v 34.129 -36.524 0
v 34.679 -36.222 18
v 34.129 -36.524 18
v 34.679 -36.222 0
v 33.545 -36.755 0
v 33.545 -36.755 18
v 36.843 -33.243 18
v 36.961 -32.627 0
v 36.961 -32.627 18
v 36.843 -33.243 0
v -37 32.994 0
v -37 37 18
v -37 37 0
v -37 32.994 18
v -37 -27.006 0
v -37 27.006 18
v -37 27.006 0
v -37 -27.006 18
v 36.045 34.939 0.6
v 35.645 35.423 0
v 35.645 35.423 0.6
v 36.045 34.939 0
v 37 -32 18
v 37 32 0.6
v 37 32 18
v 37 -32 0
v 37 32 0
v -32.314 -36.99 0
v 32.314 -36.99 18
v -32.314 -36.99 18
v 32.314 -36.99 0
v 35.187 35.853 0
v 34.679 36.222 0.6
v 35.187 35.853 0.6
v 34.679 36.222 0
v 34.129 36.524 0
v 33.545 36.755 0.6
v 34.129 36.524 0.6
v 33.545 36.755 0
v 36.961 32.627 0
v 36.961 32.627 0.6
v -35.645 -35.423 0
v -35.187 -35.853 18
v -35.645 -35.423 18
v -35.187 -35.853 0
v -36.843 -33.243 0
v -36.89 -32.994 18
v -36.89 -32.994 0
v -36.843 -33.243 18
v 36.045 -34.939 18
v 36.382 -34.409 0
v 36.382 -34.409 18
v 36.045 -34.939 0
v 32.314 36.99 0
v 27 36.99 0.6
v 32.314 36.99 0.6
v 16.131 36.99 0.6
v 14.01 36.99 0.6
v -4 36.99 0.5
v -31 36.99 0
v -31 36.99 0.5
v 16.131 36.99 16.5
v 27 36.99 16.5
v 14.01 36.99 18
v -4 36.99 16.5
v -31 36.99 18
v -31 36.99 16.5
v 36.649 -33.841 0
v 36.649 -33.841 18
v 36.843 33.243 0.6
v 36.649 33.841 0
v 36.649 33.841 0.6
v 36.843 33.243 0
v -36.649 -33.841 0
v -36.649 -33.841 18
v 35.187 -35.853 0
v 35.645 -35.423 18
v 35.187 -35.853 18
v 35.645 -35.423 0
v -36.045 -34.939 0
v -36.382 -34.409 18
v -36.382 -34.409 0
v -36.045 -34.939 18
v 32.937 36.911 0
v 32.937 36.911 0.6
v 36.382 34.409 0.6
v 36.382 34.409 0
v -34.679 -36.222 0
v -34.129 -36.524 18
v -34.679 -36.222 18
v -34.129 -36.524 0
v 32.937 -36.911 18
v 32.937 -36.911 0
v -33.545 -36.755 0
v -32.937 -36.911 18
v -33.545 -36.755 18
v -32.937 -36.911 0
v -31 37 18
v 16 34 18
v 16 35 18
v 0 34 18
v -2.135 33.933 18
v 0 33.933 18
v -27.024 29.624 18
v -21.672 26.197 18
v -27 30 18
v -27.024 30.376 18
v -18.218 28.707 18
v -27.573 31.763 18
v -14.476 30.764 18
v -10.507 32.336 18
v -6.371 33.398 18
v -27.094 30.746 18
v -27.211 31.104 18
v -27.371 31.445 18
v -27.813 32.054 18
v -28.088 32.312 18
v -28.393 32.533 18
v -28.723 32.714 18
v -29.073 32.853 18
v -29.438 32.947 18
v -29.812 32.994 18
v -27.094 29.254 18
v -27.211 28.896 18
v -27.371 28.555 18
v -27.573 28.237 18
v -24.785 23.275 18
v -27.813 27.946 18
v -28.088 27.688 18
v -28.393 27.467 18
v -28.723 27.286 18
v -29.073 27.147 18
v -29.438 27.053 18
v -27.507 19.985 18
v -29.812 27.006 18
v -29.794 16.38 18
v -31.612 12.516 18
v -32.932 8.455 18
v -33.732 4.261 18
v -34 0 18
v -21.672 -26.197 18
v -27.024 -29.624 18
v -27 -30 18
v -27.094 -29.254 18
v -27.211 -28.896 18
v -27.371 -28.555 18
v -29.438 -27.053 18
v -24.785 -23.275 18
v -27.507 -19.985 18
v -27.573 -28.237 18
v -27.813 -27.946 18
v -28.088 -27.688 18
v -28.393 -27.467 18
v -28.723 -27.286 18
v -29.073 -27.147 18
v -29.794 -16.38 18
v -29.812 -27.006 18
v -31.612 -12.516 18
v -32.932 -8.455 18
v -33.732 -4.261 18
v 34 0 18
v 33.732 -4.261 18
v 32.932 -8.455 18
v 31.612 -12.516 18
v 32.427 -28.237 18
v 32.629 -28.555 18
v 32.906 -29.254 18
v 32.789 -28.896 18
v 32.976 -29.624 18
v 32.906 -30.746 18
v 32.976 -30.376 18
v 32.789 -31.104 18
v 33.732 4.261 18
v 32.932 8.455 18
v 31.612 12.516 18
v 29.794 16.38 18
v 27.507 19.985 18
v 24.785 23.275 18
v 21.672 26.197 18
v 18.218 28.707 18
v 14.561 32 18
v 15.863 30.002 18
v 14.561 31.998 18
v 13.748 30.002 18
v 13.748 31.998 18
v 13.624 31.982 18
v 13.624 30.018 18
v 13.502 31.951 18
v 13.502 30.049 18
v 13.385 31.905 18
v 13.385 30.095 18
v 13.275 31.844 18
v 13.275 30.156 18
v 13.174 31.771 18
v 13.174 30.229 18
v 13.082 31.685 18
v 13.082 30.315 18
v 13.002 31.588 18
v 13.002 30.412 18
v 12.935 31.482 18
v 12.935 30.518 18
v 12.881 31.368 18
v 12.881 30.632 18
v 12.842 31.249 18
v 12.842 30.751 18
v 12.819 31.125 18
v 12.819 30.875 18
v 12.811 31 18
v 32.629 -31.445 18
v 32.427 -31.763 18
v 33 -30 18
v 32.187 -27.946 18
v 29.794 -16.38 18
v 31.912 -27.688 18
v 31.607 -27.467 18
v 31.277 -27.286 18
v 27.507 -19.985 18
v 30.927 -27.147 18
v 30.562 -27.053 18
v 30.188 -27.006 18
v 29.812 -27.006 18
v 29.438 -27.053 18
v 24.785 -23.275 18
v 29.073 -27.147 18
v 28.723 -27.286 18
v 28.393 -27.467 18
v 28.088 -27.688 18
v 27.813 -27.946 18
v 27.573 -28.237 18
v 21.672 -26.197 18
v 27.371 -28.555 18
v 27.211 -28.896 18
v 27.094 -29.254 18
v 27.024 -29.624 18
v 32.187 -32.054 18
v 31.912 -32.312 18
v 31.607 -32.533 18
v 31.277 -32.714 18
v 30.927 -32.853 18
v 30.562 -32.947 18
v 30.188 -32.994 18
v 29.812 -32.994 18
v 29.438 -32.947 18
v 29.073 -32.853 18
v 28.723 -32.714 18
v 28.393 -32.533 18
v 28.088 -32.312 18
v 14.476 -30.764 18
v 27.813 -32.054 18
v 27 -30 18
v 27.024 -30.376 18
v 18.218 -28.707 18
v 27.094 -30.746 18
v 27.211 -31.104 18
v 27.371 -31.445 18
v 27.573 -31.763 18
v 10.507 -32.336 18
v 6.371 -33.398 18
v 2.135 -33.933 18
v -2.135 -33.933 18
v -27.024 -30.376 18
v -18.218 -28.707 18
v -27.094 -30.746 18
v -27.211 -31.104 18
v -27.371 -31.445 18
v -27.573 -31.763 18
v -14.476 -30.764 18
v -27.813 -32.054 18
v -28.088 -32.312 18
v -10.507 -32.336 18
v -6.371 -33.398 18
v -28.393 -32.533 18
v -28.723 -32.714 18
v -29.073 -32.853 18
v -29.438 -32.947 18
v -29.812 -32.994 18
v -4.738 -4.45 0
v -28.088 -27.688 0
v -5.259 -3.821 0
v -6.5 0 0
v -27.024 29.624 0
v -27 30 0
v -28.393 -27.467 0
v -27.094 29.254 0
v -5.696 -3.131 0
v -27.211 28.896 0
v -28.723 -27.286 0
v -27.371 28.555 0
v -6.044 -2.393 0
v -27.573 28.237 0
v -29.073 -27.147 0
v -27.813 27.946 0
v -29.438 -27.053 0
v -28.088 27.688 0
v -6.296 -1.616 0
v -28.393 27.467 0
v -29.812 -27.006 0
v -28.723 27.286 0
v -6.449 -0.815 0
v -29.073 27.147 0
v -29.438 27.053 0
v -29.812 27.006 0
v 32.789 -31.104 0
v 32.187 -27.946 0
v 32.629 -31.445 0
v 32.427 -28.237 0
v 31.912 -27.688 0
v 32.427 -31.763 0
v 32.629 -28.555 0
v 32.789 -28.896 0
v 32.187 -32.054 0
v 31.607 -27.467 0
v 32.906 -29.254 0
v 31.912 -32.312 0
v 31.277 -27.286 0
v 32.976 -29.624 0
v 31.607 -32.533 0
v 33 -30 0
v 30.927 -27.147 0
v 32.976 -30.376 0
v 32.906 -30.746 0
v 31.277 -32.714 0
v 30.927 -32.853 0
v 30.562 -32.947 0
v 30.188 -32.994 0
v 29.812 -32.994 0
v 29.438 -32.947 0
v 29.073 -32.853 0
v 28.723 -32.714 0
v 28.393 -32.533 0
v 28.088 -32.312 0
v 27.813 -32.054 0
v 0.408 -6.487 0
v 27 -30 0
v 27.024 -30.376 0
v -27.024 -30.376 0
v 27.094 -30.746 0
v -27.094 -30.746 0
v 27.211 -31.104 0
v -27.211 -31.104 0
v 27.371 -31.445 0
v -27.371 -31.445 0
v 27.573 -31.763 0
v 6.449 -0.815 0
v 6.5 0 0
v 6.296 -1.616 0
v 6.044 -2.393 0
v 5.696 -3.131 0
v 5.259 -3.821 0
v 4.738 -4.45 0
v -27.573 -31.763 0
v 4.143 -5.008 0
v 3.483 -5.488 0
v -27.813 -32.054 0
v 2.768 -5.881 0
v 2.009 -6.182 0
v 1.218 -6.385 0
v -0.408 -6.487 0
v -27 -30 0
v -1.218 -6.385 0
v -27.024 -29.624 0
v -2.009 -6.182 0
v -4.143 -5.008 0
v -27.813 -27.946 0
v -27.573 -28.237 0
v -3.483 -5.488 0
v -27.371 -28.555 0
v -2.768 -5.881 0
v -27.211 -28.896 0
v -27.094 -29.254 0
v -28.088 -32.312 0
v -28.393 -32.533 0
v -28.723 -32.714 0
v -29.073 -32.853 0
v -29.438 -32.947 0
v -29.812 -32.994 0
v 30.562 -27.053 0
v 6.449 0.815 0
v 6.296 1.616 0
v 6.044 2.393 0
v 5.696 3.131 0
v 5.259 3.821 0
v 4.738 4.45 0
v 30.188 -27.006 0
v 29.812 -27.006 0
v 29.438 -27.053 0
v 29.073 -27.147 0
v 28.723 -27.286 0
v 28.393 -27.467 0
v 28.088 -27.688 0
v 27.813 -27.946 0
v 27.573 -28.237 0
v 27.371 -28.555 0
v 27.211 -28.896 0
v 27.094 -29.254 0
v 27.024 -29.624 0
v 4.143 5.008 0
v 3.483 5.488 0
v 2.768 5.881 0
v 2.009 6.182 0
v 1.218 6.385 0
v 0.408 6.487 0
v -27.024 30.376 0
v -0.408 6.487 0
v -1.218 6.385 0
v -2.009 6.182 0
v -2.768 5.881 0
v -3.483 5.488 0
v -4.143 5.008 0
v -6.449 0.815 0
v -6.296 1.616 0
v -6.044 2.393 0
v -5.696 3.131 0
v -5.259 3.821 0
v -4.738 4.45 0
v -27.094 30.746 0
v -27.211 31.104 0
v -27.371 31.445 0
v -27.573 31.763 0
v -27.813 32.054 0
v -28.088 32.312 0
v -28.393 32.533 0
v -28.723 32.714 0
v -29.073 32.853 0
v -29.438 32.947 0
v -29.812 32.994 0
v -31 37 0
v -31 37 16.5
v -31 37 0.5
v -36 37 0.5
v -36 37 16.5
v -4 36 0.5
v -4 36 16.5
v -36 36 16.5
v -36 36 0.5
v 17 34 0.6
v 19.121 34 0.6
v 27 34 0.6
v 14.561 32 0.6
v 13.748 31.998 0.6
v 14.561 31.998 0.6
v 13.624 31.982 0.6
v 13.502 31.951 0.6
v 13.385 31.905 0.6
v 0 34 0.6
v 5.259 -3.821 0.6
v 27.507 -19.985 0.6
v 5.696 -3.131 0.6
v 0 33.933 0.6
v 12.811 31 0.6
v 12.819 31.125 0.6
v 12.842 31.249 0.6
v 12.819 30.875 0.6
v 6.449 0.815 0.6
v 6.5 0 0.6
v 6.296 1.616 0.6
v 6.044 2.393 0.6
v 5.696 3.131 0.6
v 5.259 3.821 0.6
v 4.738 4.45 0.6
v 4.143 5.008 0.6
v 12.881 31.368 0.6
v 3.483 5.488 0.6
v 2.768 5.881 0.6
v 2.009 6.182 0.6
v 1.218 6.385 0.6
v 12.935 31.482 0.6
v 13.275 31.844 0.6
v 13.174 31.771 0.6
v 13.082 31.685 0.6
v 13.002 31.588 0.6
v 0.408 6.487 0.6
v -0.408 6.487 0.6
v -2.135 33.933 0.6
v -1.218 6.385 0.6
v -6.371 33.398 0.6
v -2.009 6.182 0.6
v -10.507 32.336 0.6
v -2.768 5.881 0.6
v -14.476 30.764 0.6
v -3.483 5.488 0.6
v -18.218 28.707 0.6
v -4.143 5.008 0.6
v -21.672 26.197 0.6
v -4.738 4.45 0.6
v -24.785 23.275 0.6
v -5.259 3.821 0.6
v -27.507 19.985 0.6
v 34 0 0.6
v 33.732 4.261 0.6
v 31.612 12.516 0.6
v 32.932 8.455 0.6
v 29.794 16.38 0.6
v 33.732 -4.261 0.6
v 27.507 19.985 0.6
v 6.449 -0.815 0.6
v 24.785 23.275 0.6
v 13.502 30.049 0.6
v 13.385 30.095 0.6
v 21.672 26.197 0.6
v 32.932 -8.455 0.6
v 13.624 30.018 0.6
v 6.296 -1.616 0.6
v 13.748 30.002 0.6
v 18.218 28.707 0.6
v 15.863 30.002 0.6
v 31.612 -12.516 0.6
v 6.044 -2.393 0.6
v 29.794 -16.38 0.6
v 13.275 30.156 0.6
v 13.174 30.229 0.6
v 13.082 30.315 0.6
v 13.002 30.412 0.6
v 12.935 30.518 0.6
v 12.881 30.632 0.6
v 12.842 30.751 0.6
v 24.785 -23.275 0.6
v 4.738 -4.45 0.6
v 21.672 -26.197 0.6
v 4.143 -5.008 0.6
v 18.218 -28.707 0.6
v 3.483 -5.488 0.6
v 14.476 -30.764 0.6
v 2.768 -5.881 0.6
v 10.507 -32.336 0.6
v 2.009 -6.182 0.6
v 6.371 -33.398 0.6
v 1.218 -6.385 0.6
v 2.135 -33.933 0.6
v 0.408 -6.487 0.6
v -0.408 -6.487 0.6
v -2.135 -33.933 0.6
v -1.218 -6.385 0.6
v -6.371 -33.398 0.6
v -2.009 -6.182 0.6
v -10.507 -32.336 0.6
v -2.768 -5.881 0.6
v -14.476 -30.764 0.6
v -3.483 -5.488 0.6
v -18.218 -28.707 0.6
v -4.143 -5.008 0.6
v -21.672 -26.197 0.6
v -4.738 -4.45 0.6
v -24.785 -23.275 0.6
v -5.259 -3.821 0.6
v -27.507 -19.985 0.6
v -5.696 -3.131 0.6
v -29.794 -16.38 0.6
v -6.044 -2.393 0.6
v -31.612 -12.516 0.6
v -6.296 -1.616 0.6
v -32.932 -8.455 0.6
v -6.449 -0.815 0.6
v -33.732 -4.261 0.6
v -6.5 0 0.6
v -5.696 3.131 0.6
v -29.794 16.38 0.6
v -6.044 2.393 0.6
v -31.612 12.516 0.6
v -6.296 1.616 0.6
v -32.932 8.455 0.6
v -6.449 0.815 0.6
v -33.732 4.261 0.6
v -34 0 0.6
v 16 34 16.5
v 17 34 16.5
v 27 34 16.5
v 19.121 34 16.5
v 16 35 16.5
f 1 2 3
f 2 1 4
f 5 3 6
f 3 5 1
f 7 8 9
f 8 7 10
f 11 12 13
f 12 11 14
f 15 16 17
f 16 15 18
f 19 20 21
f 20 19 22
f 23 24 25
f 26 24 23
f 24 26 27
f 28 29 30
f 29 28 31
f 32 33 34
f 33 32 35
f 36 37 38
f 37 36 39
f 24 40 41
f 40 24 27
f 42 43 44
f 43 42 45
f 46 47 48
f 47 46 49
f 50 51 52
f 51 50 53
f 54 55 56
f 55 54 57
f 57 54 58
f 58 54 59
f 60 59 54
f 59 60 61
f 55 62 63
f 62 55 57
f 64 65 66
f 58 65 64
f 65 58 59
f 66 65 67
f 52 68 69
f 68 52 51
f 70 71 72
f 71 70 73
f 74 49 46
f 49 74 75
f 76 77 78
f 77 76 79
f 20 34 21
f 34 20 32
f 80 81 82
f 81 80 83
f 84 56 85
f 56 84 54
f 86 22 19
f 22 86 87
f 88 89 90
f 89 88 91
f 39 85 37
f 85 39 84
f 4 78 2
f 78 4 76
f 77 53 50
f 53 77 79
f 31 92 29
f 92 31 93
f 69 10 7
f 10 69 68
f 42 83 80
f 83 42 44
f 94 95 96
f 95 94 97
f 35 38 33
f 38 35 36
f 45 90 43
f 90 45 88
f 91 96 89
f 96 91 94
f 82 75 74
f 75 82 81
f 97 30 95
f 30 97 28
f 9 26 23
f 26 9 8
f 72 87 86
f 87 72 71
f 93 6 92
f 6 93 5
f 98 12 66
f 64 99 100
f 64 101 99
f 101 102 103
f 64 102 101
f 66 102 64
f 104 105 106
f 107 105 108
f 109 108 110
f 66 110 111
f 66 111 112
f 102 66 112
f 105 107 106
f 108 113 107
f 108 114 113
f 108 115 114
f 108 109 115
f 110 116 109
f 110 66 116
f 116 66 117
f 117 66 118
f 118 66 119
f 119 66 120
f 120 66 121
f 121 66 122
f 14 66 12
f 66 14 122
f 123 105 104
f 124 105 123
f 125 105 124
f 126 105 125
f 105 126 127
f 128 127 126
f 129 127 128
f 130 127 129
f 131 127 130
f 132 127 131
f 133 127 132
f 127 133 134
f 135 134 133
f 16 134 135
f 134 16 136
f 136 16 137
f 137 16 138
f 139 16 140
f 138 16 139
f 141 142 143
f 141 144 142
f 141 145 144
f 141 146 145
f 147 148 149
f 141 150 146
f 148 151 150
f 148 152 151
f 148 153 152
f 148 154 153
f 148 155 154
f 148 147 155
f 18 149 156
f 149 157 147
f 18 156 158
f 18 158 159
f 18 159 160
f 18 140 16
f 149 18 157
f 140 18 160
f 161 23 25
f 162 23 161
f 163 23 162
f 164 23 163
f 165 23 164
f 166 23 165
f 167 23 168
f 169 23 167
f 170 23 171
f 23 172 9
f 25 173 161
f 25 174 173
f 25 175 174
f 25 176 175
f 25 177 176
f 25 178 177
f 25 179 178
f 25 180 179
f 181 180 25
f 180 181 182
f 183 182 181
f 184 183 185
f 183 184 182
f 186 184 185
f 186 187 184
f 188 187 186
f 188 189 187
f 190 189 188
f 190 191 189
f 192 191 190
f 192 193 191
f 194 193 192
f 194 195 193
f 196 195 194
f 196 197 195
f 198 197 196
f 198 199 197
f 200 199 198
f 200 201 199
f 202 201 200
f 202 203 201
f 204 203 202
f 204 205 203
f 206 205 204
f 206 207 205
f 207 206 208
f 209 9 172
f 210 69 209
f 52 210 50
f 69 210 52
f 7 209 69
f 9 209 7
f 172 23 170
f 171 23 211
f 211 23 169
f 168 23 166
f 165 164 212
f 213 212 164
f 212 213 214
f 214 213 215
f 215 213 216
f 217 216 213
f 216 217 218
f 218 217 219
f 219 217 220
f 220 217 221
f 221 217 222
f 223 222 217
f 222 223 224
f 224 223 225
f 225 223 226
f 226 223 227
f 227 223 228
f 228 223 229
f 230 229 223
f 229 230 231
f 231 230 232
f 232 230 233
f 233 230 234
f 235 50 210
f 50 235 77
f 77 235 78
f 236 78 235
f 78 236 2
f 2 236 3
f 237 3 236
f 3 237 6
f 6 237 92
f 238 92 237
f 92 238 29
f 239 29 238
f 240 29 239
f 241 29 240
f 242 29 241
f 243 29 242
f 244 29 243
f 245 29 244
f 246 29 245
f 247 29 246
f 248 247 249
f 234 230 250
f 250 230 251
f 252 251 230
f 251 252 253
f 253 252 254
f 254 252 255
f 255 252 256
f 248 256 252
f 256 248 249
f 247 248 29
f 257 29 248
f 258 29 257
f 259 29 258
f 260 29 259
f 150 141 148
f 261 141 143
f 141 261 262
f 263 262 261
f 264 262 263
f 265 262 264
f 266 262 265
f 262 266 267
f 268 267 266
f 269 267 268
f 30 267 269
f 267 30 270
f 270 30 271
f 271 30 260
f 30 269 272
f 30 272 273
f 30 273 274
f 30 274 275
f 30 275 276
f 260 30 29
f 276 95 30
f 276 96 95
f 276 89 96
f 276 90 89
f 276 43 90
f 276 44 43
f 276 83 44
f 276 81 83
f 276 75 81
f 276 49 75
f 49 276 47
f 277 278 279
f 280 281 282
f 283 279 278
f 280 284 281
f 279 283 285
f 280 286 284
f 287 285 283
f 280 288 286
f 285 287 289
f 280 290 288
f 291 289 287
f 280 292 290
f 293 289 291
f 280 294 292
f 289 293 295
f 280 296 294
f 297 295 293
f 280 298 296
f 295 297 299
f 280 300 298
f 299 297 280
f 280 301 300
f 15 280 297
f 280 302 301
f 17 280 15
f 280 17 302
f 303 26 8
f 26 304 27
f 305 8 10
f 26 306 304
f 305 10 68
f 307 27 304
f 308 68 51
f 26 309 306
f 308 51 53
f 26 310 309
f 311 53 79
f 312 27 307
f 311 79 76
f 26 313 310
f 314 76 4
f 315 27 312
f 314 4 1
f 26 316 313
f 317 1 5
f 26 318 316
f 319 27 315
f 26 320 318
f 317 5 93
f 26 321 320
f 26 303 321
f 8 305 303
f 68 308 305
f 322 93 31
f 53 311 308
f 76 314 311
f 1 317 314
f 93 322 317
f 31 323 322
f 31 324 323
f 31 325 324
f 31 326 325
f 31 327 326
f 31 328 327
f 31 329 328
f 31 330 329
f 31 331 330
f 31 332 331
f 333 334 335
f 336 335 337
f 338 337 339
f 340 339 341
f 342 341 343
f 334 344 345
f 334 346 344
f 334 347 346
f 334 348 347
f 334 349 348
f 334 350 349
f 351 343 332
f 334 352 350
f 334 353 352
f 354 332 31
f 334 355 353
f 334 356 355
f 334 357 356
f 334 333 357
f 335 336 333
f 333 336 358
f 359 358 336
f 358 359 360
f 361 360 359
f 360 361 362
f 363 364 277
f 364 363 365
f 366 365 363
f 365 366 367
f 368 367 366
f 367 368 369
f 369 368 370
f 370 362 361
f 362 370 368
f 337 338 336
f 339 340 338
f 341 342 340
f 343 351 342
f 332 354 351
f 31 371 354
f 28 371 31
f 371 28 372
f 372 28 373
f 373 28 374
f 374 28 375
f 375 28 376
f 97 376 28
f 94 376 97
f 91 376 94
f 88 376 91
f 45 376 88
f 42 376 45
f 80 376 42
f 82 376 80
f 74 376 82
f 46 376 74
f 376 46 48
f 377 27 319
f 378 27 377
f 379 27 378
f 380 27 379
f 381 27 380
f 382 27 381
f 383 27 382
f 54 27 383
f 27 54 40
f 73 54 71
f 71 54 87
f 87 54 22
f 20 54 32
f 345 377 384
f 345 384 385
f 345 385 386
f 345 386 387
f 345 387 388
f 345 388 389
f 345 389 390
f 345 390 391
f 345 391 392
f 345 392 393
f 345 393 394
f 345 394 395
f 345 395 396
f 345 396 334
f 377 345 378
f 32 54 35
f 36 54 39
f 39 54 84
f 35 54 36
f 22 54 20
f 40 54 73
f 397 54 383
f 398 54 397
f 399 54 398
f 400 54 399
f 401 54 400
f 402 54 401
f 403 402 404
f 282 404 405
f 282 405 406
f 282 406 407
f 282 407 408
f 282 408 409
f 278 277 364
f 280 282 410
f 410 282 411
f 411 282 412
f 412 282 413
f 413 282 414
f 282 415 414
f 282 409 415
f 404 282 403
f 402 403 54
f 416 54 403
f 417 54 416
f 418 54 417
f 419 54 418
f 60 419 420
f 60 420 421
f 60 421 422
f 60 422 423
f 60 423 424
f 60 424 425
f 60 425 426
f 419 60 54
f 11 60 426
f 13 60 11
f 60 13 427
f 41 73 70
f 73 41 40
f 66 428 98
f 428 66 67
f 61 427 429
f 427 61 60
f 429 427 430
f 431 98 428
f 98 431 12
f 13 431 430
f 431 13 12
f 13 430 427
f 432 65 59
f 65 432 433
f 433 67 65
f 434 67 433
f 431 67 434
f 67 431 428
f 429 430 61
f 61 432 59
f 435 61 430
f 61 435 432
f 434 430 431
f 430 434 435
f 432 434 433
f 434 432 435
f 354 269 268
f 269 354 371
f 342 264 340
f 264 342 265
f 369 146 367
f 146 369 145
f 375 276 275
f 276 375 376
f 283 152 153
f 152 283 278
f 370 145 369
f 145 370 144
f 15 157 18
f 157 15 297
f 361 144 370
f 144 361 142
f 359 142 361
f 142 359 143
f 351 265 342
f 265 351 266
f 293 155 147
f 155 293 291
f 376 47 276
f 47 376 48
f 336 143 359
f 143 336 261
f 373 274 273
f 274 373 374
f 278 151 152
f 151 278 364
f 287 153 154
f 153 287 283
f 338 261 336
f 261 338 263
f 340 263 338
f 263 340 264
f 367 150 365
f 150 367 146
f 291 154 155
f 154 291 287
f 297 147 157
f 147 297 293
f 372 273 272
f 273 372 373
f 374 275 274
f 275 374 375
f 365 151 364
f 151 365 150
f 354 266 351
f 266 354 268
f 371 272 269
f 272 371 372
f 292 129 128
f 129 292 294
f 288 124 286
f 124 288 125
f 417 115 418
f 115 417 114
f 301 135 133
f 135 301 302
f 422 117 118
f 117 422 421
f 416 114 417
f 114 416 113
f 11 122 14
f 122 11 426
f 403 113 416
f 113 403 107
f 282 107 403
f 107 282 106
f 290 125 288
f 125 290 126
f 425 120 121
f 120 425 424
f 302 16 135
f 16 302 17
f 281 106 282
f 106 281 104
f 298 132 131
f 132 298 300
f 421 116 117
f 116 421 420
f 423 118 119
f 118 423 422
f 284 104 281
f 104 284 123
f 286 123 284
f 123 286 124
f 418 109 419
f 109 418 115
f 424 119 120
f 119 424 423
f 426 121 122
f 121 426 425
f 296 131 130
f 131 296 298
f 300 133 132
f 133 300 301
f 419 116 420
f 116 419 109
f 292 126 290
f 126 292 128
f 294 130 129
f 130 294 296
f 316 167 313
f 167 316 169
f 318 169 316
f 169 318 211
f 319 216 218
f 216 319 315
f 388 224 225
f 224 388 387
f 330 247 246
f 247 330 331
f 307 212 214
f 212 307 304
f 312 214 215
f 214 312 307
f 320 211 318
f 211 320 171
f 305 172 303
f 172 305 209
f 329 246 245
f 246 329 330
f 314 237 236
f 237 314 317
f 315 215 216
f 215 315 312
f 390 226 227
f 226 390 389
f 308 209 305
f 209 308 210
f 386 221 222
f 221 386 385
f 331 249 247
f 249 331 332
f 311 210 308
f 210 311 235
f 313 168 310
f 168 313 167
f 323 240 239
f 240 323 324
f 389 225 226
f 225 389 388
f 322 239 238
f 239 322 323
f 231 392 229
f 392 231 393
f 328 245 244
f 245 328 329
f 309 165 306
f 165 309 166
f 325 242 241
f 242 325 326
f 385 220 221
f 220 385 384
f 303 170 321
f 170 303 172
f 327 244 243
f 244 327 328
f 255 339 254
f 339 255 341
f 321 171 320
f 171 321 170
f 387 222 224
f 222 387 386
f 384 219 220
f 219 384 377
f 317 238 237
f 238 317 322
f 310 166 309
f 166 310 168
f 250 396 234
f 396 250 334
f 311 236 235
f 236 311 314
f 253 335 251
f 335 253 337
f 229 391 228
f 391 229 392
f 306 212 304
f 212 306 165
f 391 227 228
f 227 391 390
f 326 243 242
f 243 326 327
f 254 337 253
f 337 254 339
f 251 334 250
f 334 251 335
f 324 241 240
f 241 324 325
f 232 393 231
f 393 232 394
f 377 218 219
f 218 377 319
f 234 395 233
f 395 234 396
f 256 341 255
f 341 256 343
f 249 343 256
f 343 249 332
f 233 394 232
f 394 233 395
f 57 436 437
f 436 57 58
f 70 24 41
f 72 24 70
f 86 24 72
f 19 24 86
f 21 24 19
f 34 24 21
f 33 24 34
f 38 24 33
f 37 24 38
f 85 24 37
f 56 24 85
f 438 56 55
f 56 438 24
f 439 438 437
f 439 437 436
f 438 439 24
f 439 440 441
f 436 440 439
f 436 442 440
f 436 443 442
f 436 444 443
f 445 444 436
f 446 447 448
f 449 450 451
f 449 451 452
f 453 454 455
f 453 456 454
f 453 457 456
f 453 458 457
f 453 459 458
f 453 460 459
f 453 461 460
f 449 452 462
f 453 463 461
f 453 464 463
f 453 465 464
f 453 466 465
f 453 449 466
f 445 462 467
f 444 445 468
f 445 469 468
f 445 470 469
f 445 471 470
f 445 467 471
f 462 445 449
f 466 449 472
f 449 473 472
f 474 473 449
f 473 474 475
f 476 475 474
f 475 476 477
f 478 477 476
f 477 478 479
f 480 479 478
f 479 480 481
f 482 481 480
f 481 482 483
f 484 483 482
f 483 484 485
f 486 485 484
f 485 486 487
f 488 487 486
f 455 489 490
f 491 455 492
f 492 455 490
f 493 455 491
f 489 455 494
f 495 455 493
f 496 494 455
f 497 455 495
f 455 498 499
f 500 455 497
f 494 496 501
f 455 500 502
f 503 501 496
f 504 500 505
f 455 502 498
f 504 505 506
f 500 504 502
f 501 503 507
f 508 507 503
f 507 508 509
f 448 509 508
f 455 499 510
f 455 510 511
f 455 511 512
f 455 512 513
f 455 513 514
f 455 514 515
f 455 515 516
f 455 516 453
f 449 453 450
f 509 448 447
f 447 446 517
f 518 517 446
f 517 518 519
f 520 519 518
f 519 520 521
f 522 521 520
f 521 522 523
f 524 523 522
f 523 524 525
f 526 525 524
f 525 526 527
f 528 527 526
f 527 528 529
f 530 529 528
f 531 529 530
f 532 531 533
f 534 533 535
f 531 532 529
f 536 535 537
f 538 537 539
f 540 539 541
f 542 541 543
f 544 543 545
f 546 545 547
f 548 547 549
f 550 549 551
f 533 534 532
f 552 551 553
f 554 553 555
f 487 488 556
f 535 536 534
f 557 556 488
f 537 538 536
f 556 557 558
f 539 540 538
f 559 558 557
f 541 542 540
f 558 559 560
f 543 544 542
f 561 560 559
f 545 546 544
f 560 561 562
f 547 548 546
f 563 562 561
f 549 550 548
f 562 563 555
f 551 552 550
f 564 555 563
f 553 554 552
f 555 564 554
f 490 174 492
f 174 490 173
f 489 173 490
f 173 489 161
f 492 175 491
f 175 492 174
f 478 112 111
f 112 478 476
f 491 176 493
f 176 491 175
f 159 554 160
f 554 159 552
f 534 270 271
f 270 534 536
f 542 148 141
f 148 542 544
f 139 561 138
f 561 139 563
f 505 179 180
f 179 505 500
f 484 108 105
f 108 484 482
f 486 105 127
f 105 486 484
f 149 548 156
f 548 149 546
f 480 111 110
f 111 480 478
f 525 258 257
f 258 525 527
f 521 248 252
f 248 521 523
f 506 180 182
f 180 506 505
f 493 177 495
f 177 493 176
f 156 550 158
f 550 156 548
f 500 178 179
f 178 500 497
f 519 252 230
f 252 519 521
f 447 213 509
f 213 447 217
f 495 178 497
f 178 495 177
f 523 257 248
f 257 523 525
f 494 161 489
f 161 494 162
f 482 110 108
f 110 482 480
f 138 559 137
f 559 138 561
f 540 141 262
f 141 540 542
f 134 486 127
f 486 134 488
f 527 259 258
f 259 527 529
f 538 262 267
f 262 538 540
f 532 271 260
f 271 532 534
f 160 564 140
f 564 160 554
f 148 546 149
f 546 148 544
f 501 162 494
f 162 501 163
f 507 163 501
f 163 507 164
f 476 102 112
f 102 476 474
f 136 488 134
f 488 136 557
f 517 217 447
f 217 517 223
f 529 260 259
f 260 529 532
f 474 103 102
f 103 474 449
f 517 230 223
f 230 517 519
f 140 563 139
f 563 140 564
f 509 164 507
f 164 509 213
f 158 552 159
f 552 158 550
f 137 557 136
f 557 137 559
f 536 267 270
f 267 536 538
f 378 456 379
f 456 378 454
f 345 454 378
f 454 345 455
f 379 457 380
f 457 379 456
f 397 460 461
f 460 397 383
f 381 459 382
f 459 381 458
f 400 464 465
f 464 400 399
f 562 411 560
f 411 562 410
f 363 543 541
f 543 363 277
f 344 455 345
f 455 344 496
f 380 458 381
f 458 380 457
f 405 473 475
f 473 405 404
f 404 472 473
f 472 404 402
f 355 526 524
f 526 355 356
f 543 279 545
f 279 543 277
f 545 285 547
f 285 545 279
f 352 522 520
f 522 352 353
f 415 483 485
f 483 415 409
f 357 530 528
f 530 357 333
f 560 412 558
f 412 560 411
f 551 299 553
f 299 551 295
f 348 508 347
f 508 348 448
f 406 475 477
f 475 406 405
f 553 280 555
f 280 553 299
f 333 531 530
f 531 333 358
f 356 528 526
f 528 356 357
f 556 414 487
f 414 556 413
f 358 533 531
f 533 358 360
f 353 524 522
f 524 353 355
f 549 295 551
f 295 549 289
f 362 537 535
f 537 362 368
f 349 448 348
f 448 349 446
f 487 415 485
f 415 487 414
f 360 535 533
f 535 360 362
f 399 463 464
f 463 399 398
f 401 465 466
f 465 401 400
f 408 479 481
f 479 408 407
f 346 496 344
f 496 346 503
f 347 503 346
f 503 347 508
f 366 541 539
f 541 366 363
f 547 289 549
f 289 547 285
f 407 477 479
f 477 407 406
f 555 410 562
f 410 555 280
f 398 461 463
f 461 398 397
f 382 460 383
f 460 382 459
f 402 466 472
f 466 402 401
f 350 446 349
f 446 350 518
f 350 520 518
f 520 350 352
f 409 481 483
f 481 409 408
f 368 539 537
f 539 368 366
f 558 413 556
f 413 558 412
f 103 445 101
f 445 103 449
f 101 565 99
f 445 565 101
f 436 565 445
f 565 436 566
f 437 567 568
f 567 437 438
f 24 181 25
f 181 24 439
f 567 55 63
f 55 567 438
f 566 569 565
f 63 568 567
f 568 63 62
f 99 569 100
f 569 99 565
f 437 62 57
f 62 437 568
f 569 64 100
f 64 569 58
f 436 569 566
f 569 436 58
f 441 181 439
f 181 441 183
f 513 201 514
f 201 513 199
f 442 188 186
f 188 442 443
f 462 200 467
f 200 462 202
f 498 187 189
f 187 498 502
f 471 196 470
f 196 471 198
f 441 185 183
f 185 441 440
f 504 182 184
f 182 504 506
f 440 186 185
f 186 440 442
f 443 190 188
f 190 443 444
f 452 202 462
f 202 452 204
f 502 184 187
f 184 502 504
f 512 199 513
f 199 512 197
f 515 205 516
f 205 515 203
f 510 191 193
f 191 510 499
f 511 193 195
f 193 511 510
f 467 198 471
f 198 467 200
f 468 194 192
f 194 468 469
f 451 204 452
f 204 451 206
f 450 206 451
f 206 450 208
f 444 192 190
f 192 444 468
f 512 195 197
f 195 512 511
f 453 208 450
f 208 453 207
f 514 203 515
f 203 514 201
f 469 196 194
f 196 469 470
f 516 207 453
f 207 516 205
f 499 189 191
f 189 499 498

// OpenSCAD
$fn = 50;


union() {
	difference() {
		union() {
			translate(v = [0, 0, 0]) {
				rotate(a = [0, 0, 0]) {
					hull() {
						translate(v = [-32.0000000000, 32.0000000000, 0]) {
							rotate(a = [0, 0, 0]) {
								translate(v = [0, 0, 0]) {
									rotate(a = [0, 0, 0]) {
										cylinder(h = 18, r = 5);
									}
								}
							}
						}
						translate(v = [32.0000000000, 32.0000000000, 0]) {
							rotate(a = [0, 0, 0]) {
								translate(v = [0, 0, 0]) {
									rotate(a = [0, 0, 0]) {
										cylinder(h = 18, r = 5);
									}
								}
							}
						}
						translate(v = [-32.0000000000, -32.0000000000, 0]) {
							rotate(a = [0, 0, 0]) {
								translate(v = [0, 0, 0]) {
									rotate(a = [0, 0, 0]) {
										cylinder(h = 18, r = 5);
									}
								}
							}
						}
						translate(v = [32.0000000000, -32.0000000000, 0]) {
							rotate(a = [0, 0, 0]) {
								translate(v = [0, 0, 0]) {
									rotate(a = [0, 0, 0]) {
										cylinder(h = 18, r = 5);
									}
								}
							}
						}
					}
				}
			}
			translate(v = [-37.0000000000, 31.0000000000, 0]) {
				rotate(a = [0, 0, 0]) {
					cube(size = [6, 6, 18]);
				}
			}
		}
		union() {
			#translate(v = [-36.0000000000, 36.0000000000, 0.5000000000]) {
				rotate(a = [0, 0, 0]) {
					cube(size = [32, 1, 16]);
				}
			}
			translate(v = [-37.5000000000, -30.0000000000, -125]) {
				rotate(a = [0, 0, 0]) {
					hull() {
						translate(v = [7.5000000000, 0, 0]) {
							rotate(a = [0, 0, 0]) {
								translate(v = [0, 0, 0]) {
									rotate(a = [0, 0, 0]) {
										cylinder(h = 250, r = 3.0000000000);
									}
								}
							}
						}
						translate(v = [-7.5000000000, 0, 0]) {
							rotate(a = [0, 0, 0]) {
								translate(v = [0, 0, 0]) {
									rotate(a = [0, 0, 0]) {
										cylinder(h = 250, r = 3.0000000000);
									}
								}
							}
						}
					}
				}
			}
			translate(v = [-37.5000000000, 30.0000000000, -125]) {
				rotate(a = [0, 0, 0]) {
					hull() {
						translate(v = [7.5000000000, 0, 0]) {
							rotate(a = [0, 0, 0]) {
								translate(v = [0, 0, 0]) {
									rotate(a = [0, 0, 0]) {
										cylinder(h = 250, r = 3.0000000000);
									}
								}
							}
						}
						translate(v = [-7.5000000000, 0, 0]) {
							rotate(a = [0, 0, 0]) {
								translate(v = [0, 0, 0]) {
									rotate(a = [0, 0, 0]) {
										cylinder(h = 250, r = 3.0000000000);
									}
								}
							}
						}
					}
				}
			}
			translate(v = [30.0000000000, -30.0000000000, -125.0000000000]) {
				rotate(a = [0, 0, 0]) {
					cylinder(h = 250, r = 3.0000000000);
				}
			}
			translate(v = [0, 0, 0.6000000000]) {
				rotate(a = [0, 0, 0]) {
					cylinder(h = 20.4000000000, r = 34.0000000000);
				}
			}
			translate(v = [0, 0, -9.0000000000]) {
				rotate(a = [0, 0, 0]) {
					cylinder(h = 18, r = 6.5000000000);
				}
			}
			translate(v = [0.0000000000, 32.0000000000, 0.6000000000]) {
				rotate(a = [0, 0, 0]) {
					cube(size = [37.0000000000, 2, 20.4000000000]);
				}
			}
			translate(v = [27.0000000000, 32.0000000000, 0.6000000000]) {
				rotate(a = [0, 0, 0]) {
					cube(size = [10, 5, 20.4000000000]);
				}
			}
			translate(v = [16.0000000000, 32.0000000000, 16.5000000000]) {
				rotate(a = [0, 0, 0]) {
					cube(size = [21, 5, 1.5000000000]);
				}
			}
			translate(v = [13.2500000000, 37.7500000000, 0.6000000000]) {
				rotate(a = [0, 0, -45]) {
					cube(size = [7.5000000000, 1.5000000000, 20.4000000000]);
				}
			}
			translate(v = [7.0610000000, 30.0000000000, 0.6000000000]) {
				rotate(a = [0, 0, 0]) {
					cube(size = [7.5000000000, 2, 17.4000000000]);
				}
			}
		}
	}
	union() {
		translate(v = [16.3110000000, 31.0000000000, 0]) {
			rotate(a = [0, 0, 0]) {
				hull() {
					translate(v = [2.5000000000, 0, 0]) {
						rotate(a = [0, 0, 0]) {
							#translate(v = [0, 0, 0]) {
								rotate(a = [0, 0, 0]) {
									cylinder(h = 18, r = 1.0000000000);
								}
							}
						}
					}
					translate(v = [-2.5000000000, 0, 0]) {
						rotate(a = [0, 0, 0]) {
							#translate(v = [0, 0, 0]) {
								rotate(a = [0, 0, 0]) {
									cylinder(h = 18, r = 1.0000000000);
								}
							}
						}
					}
				}
			}
		}
	}
}
